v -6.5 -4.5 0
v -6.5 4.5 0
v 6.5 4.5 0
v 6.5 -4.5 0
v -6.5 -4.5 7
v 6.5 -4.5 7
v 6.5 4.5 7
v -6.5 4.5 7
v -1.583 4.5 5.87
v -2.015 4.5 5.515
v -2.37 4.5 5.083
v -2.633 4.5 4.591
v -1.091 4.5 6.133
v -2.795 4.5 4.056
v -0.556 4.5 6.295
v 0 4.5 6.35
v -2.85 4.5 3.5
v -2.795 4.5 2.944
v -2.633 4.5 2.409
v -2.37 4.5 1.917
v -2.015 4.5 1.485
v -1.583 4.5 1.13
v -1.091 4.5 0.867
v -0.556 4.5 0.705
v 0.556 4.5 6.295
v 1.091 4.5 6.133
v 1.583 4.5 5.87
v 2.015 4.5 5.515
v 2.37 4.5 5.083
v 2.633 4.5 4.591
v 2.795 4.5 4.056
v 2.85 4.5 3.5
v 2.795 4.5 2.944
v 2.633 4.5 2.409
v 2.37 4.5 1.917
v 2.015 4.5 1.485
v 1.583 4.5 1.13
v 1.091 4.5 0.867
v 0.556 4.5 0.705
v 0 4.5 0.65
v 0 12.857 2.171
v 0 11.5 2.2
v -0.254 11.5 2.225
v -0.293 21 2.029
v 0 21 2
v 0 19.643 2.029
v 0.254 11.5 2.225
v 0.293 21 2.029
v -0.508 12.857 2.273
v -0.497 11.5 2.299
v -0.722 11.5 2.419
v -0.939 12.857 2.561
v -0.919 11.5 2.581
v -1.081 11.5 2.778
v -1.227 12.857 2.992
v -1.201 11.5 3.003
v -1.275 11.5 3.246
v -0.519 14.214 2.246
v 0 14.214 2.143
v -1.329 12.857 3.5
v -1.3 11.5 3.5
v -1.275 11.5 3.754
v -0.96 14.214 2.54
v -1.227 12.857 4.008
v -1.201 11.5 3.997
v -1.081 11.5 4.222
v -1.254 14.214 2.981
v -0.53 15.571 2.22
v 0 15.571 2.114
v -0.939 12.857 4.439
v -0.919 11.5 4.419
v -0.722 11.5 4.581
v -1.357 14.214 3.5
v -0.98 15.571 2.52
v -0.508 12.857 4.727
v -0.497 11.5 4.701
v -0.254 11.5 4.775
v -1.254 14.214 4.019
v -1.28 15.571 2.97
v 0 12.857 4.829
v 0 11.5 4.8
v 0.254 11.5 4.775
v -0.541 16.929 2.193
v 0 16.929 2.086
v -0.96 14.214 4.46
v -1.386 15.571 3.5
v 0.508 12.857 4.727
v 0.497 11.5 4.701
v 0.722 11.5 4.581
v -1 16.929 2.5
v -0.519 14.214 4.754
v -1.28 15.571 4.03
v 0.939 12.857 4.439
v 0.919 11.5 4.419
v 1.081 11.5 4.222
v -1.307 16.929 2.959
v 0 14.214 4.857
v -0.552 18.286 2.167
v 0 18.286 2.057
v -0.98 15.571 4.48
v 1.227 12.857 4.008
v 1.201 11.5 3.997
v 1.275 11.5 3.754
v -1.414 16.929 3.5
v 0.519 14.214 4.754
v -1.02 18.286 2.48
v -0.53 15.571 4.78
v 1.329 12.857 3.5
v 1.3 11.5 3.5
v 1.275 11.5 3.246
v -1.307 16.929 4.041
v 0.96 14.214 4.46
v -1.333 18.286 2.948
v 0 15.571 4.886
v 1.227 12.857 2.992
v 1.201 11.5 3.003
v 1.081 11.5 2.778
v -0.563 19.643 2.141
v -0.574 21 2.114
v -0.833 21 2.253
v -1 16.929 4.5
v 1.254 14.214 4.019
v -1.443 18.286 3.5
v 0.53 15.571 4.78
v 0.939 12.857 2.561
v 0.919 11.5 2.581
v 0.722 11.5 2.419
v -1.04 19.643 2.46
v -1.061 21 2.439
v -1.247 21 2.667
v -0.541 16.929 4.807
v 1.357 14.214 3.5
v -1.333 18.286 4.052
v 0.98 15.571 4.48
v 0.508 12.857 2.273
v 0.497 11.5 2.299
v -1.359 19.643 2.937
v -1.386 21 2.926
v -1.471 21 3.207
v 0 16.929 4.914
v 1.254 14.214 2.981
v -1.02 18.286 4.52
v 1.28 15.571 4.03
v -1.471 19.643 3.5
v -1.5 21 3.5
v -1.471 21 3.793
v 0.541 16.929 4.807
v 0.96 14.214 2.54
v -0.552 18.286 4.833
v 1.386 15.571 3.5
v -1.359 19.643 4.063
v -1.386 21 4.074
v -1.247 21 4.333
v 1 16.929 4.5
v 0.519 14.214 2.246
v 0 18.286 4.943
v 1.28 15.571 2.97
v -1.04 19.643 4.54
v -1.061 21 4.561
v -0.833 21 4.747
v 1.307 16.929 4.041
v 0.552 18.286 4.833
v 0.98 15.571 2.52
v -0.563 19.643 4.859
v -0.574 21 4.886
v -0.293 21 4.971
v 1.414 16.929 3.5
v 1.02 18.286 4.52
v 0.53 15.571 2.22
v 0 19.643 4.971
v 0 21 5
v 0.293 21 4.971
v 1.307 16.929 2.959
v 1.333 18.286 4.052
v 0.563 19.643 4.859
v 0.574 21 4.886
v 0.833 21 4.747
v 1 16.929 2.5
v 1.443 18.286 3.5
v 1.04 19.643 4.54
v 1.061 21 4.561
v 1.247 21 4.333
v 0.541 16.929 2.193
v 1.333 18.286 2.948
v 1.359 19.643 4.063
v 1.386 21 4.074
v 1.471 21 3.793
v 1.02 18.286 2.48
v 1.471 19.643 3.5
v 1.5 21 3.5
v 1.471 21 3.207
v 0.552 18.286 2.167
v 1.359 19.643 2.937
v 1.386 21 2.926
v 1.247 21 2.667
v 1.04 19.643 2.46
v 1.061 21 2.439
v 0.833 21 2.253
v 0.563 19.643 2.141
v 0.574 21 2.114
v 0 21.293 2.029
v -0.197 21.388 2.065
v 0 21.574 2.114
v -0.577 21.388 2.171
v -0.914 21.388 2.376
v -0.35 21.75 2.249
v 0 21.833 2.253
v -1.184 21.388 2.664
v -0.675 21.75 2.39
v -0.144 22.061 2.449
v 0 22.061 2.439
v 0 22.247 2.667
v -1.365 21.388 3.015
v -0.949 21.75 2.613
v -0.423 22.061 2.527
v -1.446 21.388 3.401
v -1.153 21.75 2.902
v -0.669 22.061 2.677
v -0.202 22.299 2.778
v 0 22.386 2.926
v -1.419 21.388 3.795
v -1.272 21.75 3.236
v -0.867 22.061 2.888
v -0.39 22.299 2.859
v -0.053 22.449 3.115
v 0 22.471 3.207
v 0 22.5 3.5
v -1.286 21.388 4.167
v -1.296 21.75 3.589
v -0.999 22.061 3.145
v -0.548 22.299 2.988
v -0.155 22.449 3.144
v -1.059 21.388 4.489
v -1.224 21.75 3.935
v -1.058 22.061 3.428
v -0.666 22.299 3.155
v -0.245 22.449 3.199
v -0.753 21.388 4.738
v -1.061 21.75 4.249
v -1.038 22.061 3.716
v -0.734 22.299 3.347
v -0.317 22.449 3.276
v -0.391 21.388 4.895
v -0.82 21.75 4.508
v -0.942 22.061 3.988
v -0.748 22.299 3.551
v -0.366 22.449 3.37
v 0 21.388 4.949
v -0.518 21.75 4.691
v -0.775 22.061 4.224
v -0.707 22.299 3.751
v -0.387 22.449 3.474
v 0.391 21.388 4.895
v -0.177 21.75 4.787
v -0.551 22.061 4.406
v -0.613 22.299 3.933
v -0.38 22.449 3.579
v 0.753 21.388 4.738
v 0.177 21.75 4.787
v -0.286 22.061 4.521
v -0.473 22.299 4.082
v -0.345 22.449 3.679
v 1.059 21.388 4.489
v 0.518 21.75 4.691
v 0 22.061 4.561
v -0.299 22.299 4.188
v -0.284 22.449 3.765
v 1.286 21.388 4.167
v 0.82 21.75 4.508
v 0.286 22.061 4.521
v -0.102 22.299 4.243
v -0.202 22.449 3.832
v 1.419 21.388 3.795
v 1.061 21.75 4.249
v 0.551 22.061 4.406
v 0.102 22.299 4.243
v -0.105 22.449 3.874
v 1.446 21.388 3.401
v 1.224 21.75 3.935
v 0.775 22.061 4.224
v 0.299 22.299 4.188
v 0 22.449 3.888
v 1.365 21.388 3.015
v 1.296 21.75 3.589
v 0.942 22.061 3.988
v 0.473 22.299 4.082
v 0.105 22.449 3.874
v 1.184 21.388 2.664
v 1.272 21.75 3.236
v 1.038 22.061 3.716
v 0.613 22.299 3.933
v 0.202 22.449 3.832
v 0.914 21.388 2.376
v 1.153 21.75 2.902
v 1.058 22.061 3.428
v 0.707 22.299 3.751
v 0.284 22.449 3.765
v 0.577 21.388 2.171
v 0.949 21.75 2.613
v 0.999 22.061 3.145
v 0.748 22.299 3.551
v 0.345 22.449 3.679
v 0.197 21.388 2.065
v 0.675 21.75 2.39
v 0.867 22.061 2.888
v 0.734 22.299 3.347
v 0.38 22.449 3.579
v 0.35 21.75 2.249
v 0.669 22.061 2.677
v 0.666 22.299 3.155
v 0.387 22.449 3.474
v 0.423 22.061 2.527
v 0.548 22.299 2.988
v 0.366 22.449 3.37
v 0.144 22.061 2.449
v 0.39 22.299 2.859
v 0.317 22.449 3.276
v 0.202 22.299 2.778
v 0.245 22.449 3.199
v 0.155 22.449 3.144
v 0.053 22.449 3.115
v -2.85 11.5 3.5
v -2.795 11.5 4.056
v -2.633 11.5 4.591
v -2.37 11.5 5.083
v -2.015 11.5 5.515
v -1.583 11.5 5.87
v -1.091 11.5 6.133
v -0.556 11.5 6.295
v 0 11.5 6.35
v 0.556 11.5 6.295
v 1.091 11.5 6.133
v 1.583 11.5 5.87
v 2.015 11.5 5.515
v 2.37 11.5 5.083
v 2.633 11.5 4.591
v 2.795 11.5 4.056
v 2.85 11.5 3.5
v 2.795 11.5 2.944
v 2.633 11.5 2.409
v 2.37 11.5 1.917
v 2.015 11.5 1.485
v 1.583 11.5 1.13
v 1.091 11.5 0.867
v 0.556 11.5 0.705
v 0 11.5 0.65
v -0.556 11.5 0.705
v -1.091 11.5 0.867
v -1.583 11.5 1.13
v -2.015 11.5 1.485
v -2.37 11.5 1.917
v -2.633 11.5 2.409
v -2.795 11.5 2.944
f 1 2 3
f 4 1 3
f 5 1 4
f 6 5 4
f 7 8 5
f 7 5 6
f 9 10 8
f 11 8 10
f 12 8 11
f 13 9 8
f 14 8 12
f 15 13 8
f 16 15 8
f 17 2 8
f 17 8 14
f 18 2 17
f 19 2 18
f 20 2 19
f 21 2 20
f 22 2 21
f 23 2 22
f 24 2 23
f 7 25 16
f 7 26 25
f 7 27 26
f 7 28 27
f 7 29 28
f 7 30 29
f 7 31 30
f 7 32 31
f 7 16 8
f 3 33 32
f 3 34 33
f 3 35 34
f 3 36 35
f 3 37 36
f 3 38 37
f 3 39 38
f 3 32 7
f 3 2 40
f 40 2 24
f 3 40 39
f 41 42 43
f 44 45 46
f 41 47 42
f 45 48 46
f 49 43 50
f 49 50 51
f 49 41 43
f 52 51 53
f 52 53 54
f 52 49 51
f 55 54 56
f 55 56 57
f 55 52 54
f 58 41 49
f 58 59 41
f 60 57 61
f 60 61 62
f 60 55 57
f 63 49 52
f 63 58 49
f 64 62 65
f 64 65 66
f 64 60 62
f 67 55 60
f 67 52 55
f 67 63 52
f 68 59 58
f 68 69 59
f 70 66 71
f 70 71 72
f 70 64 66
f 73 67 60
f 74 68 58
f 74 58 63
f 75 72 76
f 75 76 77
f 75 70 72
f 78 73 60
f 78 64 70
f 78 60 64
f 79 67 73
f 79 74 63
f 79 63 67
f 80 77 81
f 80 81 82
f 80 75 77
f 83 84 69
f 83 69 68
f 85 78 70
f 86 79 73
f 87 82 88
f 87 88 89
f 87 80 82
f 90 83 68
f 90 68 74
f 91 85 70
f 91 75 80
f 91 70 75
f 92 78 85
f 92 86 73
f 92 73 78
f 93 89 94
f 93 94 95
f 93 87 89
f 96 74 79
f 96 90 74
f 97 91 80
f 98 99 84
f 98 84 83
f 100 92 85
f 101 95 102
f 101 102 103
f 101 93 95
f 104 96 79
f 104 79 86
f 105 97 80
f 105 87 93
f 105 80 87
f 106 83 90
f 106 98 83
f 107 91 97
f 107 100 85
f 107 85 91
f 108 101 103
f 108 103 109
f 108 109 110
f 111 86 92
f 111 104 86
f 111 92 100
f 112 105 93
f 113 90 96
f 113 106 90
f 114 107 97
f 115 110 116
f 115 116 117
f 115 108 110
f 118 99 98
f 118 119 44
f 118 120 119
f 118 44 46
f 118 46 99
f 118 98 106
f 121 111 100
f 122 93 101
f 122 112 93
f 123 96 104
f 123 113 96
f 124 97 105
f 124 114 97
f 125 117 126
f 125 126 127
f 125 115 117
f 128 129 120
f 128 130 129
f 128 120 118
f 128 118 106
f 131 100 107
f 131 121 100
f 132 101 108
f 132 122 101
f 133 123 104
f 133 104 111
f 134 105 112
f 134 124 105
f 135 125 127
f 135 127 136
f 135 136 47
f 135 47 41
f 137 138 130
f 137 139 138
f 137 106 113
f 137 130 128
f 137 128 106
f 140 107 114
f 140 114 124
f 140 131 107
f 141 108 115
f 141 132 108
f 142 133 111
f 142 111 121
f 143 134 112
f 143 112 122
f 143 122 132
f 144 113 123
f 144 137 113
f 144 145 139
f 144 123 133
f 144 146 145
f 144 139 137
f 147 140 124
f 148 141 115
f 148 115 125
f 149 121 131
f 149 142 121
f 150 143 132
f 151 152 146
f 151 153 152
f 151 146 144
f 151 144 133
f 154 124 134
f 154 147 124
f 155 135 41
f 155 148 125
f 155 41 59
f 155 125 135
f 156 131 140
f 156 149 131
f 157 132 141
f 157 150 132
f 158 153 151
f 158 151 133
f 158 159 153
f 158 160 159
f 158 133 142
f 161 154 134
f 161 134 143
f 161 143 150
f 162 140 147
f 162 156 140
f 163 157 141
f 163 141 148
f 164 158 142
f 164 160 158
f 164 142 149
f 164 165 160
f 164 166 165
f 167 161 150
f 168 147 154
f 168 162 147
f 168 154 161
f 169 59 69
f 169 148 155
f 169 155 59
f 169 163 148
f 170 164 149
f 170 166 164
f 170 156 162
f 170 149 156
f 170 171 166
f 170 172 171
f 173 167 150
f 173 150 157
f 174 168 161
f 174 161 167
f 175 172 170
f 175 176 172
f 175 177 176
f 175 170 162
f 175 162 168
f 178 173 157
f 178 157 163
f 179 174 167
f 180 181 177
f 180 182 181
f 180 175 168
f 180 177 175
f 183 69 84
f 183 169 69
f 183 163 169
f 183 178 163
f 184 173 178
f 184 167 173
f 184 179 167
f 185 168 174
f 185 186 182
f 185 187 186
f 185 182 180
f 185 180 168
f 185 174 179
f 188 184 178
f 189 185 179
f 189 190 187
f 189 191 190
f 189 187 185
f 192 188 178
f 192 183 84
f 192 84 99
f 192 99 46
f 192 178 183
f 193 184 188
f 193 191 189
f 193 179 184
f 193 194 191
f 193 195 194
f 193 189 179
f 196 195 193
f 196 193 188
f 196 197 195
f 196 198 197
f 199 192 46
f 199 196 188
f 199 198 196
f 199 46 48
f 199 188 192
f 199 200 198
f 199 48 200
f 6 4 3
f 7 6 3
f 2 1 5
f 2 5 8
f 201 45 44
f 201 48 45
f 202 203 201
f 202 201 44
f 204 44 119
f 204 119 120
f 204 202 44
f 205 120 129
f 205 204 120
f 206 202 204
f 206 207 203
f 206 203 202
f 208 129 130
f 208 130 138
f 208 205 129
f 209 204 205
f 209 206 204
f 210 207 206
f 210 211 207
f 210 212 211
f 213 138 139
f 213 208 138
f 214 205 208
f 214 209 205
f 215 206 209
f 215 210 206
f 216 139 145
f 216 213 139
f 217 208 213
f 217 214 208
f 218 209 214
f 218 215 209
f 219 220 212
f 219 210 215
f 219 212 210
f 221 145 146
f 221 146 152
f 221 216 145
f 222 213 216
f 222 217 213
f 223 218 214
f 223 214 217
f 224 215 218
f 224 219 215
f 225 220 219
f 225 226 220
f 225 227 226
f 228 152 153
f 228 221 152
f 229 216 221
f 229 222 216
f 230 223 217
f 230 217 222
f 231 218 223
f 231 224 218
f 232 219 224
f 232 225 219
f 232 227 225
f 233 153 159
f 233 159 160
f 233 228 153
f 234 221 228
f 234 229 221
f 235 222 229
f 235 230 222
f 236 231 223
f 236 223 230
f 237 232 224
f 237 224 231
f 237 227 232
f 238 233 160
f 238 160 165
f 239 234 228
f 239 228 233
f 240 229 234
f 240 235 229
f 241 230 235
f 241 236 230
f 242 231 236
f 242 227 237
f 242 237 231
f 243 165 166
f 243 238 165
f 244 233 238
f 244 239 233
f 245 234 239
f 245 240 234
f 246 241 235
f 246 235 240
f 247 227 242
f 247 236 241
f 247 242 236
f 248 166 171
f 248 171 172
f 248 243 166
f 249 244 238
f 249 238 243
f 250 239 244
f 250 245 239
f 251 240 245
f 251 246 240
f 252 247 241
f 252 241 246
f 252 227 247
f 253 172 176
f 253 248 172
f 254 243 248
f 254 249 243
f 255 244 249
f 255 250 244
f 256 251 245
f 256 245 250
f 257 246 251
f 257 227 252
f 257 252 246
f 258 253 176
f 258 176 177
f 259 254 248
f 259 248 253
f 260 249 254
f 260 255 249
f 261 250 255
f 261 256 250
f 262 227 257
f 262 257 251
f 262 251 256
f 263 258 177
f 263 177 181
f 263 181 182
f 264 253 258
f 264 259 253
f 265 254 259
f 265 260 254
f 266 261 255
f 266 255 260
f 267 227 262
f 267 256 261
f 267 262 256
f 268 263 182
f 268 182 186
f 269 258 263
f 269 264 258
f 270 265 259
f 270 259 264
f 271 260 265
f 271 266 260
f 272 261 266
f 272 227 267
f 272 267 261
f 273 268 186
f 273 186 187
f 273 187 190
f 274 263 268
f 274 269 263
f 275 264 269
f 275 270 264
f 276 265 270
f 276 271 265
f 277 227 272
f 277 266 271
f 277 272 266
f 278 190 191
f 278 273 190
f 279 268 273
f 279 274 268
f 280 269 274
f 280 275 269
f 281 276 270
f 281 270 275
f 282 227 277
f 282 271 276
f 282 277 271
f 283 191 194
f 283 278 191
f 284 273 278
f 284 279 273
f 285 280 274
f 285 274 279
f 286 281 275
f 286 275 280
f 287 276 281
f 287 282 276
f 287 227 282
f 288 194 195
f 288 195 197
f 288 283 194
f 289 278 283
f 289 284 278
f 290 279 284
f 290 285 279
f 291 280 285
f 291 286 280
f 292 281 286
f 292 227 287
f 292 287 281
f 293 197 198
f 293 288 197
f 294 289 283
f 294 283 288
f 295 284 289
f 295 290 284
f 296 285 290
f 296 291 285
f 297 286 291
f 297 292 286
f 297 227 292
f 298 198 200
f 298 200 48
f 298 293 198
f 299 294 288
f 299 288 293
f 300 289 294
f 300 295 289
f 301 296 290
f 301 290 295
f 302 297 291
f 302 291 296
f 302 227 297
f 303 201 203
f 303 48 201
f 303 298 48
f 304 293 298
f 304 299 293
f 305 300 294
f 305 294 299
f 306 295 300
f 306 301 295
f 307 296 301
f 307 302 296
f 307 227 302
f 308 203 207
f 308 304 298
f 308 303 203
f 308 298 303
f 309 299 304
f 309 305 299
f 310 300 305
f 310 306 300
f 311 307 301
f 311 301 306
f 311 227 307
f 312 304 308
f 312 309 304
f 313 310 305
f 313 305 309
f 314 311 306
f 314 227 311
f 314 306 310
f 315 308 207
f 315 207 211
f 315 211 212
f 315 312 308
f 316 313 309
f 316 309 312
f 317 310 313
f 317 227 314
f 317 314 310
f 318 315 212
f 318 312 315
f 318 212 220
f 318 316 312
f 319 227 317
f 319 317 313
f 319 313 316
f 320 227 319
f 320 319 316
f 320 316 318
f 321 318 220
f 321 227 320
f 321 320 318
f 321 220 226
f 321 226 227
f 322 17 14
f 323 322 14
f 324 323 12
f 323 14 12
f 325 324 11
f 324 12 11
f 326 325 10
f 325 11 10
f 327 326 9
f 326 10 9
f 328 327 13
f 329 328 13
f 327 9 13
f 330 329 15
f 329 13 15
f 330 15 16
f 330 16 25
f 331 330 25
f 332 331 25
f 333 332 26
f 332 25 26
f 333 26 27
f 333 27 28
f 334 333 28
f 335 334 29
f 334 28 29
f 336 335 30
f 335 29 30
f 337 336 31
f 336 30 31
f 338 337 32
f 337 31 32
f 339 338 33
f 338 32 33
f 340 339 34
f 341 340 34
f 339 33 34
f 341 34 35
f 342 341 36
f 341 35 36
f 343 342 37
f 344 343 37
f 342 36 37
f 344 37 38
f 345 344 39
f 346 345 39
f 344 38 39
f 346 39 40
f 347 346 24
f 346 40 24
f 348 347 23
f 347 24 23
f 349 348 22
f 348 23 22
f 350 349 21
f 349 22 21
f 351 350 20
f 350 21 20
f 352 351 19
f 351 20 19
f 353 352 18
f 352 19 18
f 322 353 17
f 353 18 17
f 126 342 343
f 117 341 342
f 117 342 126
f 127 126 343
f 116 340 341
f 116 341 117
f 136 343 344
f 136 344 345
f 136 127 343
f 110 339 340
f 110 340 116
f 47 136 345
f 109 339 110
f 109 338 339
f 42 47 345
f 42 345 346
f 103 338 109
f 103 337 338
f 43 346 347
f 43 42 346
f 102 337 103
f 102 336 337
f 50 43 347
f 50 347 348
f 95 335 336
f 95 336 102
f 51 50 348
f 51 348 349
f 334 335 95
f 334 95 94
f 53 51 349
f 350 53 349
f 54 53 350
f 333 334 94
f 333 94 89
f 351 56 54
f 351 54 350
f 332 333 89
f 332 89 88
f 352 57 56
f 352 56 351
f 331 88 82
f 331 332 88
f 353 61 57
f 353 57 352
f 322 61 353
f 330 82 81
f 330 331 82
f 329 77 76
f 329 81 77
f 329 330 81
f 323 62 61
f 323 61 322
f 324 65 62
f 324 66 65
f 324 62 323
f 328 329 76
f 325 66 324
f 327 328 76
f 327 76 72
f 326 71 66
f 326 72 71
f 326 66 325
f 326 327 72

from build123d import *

# Parameters (mm, degrees)
SKETCH_1_W      = 13
SKETCH_1_H      = 9
EXTRUDE_1_DEPTH = 7
SKETCH_2_R      = 2.85
EXTRUDE_2_DEPTH = 7


with BuildPart() as part:
    # 草图1 → 凸台-拉伸1 (new body)
    with BuildSketch(Plane.XY):
        Rectangle(SKETCH_1_W, SKETCH_1_H)
    extrude(amount=EXTRUDE_1_DEPTH)

    # 草图2 → 凸台-拉伸2 (add)
    with BuildSketch(Plane(origin=(0, 4.5, 0), x_dir=(1, 0, 0), z_dir=(0, 1, 0))):
        with Locations(Location((0, -3.5, 0), (0, 0, 180))):
            Circle(SKETCH_2_R)
    extrude(amount=EXTRUDE_2_DEPTH)

    # 草图3 → 旋转1 (revolve)
    with BuildSketch(Plane(origin=(0, 0, 0), x_dir=(0, 0, -1), z_dir=(1, 0, 0)), mode=Mode.PRIVATE) as revolve_1_sk:
        with BuildLine():
            Line((-3.5, 11.5), (-4.8, 11.5))
            Line((-4.8, 11.5), (-5, 21))
            ThreePointArc((-5, 21), (-4.560660172, 22.060660172), (-3.5, 22.5))
            Line((-3.5, 22.5), (-3.5, 11.5))
        make_face()
    revolve(revolve_1_sk.sketch.rotate(Axis((0, 11.5, 3.5), (0, 1, 0)), 180), axis=Axis((0, 11.5, 3.5), (0, 1, 0)))


solid = part.part
